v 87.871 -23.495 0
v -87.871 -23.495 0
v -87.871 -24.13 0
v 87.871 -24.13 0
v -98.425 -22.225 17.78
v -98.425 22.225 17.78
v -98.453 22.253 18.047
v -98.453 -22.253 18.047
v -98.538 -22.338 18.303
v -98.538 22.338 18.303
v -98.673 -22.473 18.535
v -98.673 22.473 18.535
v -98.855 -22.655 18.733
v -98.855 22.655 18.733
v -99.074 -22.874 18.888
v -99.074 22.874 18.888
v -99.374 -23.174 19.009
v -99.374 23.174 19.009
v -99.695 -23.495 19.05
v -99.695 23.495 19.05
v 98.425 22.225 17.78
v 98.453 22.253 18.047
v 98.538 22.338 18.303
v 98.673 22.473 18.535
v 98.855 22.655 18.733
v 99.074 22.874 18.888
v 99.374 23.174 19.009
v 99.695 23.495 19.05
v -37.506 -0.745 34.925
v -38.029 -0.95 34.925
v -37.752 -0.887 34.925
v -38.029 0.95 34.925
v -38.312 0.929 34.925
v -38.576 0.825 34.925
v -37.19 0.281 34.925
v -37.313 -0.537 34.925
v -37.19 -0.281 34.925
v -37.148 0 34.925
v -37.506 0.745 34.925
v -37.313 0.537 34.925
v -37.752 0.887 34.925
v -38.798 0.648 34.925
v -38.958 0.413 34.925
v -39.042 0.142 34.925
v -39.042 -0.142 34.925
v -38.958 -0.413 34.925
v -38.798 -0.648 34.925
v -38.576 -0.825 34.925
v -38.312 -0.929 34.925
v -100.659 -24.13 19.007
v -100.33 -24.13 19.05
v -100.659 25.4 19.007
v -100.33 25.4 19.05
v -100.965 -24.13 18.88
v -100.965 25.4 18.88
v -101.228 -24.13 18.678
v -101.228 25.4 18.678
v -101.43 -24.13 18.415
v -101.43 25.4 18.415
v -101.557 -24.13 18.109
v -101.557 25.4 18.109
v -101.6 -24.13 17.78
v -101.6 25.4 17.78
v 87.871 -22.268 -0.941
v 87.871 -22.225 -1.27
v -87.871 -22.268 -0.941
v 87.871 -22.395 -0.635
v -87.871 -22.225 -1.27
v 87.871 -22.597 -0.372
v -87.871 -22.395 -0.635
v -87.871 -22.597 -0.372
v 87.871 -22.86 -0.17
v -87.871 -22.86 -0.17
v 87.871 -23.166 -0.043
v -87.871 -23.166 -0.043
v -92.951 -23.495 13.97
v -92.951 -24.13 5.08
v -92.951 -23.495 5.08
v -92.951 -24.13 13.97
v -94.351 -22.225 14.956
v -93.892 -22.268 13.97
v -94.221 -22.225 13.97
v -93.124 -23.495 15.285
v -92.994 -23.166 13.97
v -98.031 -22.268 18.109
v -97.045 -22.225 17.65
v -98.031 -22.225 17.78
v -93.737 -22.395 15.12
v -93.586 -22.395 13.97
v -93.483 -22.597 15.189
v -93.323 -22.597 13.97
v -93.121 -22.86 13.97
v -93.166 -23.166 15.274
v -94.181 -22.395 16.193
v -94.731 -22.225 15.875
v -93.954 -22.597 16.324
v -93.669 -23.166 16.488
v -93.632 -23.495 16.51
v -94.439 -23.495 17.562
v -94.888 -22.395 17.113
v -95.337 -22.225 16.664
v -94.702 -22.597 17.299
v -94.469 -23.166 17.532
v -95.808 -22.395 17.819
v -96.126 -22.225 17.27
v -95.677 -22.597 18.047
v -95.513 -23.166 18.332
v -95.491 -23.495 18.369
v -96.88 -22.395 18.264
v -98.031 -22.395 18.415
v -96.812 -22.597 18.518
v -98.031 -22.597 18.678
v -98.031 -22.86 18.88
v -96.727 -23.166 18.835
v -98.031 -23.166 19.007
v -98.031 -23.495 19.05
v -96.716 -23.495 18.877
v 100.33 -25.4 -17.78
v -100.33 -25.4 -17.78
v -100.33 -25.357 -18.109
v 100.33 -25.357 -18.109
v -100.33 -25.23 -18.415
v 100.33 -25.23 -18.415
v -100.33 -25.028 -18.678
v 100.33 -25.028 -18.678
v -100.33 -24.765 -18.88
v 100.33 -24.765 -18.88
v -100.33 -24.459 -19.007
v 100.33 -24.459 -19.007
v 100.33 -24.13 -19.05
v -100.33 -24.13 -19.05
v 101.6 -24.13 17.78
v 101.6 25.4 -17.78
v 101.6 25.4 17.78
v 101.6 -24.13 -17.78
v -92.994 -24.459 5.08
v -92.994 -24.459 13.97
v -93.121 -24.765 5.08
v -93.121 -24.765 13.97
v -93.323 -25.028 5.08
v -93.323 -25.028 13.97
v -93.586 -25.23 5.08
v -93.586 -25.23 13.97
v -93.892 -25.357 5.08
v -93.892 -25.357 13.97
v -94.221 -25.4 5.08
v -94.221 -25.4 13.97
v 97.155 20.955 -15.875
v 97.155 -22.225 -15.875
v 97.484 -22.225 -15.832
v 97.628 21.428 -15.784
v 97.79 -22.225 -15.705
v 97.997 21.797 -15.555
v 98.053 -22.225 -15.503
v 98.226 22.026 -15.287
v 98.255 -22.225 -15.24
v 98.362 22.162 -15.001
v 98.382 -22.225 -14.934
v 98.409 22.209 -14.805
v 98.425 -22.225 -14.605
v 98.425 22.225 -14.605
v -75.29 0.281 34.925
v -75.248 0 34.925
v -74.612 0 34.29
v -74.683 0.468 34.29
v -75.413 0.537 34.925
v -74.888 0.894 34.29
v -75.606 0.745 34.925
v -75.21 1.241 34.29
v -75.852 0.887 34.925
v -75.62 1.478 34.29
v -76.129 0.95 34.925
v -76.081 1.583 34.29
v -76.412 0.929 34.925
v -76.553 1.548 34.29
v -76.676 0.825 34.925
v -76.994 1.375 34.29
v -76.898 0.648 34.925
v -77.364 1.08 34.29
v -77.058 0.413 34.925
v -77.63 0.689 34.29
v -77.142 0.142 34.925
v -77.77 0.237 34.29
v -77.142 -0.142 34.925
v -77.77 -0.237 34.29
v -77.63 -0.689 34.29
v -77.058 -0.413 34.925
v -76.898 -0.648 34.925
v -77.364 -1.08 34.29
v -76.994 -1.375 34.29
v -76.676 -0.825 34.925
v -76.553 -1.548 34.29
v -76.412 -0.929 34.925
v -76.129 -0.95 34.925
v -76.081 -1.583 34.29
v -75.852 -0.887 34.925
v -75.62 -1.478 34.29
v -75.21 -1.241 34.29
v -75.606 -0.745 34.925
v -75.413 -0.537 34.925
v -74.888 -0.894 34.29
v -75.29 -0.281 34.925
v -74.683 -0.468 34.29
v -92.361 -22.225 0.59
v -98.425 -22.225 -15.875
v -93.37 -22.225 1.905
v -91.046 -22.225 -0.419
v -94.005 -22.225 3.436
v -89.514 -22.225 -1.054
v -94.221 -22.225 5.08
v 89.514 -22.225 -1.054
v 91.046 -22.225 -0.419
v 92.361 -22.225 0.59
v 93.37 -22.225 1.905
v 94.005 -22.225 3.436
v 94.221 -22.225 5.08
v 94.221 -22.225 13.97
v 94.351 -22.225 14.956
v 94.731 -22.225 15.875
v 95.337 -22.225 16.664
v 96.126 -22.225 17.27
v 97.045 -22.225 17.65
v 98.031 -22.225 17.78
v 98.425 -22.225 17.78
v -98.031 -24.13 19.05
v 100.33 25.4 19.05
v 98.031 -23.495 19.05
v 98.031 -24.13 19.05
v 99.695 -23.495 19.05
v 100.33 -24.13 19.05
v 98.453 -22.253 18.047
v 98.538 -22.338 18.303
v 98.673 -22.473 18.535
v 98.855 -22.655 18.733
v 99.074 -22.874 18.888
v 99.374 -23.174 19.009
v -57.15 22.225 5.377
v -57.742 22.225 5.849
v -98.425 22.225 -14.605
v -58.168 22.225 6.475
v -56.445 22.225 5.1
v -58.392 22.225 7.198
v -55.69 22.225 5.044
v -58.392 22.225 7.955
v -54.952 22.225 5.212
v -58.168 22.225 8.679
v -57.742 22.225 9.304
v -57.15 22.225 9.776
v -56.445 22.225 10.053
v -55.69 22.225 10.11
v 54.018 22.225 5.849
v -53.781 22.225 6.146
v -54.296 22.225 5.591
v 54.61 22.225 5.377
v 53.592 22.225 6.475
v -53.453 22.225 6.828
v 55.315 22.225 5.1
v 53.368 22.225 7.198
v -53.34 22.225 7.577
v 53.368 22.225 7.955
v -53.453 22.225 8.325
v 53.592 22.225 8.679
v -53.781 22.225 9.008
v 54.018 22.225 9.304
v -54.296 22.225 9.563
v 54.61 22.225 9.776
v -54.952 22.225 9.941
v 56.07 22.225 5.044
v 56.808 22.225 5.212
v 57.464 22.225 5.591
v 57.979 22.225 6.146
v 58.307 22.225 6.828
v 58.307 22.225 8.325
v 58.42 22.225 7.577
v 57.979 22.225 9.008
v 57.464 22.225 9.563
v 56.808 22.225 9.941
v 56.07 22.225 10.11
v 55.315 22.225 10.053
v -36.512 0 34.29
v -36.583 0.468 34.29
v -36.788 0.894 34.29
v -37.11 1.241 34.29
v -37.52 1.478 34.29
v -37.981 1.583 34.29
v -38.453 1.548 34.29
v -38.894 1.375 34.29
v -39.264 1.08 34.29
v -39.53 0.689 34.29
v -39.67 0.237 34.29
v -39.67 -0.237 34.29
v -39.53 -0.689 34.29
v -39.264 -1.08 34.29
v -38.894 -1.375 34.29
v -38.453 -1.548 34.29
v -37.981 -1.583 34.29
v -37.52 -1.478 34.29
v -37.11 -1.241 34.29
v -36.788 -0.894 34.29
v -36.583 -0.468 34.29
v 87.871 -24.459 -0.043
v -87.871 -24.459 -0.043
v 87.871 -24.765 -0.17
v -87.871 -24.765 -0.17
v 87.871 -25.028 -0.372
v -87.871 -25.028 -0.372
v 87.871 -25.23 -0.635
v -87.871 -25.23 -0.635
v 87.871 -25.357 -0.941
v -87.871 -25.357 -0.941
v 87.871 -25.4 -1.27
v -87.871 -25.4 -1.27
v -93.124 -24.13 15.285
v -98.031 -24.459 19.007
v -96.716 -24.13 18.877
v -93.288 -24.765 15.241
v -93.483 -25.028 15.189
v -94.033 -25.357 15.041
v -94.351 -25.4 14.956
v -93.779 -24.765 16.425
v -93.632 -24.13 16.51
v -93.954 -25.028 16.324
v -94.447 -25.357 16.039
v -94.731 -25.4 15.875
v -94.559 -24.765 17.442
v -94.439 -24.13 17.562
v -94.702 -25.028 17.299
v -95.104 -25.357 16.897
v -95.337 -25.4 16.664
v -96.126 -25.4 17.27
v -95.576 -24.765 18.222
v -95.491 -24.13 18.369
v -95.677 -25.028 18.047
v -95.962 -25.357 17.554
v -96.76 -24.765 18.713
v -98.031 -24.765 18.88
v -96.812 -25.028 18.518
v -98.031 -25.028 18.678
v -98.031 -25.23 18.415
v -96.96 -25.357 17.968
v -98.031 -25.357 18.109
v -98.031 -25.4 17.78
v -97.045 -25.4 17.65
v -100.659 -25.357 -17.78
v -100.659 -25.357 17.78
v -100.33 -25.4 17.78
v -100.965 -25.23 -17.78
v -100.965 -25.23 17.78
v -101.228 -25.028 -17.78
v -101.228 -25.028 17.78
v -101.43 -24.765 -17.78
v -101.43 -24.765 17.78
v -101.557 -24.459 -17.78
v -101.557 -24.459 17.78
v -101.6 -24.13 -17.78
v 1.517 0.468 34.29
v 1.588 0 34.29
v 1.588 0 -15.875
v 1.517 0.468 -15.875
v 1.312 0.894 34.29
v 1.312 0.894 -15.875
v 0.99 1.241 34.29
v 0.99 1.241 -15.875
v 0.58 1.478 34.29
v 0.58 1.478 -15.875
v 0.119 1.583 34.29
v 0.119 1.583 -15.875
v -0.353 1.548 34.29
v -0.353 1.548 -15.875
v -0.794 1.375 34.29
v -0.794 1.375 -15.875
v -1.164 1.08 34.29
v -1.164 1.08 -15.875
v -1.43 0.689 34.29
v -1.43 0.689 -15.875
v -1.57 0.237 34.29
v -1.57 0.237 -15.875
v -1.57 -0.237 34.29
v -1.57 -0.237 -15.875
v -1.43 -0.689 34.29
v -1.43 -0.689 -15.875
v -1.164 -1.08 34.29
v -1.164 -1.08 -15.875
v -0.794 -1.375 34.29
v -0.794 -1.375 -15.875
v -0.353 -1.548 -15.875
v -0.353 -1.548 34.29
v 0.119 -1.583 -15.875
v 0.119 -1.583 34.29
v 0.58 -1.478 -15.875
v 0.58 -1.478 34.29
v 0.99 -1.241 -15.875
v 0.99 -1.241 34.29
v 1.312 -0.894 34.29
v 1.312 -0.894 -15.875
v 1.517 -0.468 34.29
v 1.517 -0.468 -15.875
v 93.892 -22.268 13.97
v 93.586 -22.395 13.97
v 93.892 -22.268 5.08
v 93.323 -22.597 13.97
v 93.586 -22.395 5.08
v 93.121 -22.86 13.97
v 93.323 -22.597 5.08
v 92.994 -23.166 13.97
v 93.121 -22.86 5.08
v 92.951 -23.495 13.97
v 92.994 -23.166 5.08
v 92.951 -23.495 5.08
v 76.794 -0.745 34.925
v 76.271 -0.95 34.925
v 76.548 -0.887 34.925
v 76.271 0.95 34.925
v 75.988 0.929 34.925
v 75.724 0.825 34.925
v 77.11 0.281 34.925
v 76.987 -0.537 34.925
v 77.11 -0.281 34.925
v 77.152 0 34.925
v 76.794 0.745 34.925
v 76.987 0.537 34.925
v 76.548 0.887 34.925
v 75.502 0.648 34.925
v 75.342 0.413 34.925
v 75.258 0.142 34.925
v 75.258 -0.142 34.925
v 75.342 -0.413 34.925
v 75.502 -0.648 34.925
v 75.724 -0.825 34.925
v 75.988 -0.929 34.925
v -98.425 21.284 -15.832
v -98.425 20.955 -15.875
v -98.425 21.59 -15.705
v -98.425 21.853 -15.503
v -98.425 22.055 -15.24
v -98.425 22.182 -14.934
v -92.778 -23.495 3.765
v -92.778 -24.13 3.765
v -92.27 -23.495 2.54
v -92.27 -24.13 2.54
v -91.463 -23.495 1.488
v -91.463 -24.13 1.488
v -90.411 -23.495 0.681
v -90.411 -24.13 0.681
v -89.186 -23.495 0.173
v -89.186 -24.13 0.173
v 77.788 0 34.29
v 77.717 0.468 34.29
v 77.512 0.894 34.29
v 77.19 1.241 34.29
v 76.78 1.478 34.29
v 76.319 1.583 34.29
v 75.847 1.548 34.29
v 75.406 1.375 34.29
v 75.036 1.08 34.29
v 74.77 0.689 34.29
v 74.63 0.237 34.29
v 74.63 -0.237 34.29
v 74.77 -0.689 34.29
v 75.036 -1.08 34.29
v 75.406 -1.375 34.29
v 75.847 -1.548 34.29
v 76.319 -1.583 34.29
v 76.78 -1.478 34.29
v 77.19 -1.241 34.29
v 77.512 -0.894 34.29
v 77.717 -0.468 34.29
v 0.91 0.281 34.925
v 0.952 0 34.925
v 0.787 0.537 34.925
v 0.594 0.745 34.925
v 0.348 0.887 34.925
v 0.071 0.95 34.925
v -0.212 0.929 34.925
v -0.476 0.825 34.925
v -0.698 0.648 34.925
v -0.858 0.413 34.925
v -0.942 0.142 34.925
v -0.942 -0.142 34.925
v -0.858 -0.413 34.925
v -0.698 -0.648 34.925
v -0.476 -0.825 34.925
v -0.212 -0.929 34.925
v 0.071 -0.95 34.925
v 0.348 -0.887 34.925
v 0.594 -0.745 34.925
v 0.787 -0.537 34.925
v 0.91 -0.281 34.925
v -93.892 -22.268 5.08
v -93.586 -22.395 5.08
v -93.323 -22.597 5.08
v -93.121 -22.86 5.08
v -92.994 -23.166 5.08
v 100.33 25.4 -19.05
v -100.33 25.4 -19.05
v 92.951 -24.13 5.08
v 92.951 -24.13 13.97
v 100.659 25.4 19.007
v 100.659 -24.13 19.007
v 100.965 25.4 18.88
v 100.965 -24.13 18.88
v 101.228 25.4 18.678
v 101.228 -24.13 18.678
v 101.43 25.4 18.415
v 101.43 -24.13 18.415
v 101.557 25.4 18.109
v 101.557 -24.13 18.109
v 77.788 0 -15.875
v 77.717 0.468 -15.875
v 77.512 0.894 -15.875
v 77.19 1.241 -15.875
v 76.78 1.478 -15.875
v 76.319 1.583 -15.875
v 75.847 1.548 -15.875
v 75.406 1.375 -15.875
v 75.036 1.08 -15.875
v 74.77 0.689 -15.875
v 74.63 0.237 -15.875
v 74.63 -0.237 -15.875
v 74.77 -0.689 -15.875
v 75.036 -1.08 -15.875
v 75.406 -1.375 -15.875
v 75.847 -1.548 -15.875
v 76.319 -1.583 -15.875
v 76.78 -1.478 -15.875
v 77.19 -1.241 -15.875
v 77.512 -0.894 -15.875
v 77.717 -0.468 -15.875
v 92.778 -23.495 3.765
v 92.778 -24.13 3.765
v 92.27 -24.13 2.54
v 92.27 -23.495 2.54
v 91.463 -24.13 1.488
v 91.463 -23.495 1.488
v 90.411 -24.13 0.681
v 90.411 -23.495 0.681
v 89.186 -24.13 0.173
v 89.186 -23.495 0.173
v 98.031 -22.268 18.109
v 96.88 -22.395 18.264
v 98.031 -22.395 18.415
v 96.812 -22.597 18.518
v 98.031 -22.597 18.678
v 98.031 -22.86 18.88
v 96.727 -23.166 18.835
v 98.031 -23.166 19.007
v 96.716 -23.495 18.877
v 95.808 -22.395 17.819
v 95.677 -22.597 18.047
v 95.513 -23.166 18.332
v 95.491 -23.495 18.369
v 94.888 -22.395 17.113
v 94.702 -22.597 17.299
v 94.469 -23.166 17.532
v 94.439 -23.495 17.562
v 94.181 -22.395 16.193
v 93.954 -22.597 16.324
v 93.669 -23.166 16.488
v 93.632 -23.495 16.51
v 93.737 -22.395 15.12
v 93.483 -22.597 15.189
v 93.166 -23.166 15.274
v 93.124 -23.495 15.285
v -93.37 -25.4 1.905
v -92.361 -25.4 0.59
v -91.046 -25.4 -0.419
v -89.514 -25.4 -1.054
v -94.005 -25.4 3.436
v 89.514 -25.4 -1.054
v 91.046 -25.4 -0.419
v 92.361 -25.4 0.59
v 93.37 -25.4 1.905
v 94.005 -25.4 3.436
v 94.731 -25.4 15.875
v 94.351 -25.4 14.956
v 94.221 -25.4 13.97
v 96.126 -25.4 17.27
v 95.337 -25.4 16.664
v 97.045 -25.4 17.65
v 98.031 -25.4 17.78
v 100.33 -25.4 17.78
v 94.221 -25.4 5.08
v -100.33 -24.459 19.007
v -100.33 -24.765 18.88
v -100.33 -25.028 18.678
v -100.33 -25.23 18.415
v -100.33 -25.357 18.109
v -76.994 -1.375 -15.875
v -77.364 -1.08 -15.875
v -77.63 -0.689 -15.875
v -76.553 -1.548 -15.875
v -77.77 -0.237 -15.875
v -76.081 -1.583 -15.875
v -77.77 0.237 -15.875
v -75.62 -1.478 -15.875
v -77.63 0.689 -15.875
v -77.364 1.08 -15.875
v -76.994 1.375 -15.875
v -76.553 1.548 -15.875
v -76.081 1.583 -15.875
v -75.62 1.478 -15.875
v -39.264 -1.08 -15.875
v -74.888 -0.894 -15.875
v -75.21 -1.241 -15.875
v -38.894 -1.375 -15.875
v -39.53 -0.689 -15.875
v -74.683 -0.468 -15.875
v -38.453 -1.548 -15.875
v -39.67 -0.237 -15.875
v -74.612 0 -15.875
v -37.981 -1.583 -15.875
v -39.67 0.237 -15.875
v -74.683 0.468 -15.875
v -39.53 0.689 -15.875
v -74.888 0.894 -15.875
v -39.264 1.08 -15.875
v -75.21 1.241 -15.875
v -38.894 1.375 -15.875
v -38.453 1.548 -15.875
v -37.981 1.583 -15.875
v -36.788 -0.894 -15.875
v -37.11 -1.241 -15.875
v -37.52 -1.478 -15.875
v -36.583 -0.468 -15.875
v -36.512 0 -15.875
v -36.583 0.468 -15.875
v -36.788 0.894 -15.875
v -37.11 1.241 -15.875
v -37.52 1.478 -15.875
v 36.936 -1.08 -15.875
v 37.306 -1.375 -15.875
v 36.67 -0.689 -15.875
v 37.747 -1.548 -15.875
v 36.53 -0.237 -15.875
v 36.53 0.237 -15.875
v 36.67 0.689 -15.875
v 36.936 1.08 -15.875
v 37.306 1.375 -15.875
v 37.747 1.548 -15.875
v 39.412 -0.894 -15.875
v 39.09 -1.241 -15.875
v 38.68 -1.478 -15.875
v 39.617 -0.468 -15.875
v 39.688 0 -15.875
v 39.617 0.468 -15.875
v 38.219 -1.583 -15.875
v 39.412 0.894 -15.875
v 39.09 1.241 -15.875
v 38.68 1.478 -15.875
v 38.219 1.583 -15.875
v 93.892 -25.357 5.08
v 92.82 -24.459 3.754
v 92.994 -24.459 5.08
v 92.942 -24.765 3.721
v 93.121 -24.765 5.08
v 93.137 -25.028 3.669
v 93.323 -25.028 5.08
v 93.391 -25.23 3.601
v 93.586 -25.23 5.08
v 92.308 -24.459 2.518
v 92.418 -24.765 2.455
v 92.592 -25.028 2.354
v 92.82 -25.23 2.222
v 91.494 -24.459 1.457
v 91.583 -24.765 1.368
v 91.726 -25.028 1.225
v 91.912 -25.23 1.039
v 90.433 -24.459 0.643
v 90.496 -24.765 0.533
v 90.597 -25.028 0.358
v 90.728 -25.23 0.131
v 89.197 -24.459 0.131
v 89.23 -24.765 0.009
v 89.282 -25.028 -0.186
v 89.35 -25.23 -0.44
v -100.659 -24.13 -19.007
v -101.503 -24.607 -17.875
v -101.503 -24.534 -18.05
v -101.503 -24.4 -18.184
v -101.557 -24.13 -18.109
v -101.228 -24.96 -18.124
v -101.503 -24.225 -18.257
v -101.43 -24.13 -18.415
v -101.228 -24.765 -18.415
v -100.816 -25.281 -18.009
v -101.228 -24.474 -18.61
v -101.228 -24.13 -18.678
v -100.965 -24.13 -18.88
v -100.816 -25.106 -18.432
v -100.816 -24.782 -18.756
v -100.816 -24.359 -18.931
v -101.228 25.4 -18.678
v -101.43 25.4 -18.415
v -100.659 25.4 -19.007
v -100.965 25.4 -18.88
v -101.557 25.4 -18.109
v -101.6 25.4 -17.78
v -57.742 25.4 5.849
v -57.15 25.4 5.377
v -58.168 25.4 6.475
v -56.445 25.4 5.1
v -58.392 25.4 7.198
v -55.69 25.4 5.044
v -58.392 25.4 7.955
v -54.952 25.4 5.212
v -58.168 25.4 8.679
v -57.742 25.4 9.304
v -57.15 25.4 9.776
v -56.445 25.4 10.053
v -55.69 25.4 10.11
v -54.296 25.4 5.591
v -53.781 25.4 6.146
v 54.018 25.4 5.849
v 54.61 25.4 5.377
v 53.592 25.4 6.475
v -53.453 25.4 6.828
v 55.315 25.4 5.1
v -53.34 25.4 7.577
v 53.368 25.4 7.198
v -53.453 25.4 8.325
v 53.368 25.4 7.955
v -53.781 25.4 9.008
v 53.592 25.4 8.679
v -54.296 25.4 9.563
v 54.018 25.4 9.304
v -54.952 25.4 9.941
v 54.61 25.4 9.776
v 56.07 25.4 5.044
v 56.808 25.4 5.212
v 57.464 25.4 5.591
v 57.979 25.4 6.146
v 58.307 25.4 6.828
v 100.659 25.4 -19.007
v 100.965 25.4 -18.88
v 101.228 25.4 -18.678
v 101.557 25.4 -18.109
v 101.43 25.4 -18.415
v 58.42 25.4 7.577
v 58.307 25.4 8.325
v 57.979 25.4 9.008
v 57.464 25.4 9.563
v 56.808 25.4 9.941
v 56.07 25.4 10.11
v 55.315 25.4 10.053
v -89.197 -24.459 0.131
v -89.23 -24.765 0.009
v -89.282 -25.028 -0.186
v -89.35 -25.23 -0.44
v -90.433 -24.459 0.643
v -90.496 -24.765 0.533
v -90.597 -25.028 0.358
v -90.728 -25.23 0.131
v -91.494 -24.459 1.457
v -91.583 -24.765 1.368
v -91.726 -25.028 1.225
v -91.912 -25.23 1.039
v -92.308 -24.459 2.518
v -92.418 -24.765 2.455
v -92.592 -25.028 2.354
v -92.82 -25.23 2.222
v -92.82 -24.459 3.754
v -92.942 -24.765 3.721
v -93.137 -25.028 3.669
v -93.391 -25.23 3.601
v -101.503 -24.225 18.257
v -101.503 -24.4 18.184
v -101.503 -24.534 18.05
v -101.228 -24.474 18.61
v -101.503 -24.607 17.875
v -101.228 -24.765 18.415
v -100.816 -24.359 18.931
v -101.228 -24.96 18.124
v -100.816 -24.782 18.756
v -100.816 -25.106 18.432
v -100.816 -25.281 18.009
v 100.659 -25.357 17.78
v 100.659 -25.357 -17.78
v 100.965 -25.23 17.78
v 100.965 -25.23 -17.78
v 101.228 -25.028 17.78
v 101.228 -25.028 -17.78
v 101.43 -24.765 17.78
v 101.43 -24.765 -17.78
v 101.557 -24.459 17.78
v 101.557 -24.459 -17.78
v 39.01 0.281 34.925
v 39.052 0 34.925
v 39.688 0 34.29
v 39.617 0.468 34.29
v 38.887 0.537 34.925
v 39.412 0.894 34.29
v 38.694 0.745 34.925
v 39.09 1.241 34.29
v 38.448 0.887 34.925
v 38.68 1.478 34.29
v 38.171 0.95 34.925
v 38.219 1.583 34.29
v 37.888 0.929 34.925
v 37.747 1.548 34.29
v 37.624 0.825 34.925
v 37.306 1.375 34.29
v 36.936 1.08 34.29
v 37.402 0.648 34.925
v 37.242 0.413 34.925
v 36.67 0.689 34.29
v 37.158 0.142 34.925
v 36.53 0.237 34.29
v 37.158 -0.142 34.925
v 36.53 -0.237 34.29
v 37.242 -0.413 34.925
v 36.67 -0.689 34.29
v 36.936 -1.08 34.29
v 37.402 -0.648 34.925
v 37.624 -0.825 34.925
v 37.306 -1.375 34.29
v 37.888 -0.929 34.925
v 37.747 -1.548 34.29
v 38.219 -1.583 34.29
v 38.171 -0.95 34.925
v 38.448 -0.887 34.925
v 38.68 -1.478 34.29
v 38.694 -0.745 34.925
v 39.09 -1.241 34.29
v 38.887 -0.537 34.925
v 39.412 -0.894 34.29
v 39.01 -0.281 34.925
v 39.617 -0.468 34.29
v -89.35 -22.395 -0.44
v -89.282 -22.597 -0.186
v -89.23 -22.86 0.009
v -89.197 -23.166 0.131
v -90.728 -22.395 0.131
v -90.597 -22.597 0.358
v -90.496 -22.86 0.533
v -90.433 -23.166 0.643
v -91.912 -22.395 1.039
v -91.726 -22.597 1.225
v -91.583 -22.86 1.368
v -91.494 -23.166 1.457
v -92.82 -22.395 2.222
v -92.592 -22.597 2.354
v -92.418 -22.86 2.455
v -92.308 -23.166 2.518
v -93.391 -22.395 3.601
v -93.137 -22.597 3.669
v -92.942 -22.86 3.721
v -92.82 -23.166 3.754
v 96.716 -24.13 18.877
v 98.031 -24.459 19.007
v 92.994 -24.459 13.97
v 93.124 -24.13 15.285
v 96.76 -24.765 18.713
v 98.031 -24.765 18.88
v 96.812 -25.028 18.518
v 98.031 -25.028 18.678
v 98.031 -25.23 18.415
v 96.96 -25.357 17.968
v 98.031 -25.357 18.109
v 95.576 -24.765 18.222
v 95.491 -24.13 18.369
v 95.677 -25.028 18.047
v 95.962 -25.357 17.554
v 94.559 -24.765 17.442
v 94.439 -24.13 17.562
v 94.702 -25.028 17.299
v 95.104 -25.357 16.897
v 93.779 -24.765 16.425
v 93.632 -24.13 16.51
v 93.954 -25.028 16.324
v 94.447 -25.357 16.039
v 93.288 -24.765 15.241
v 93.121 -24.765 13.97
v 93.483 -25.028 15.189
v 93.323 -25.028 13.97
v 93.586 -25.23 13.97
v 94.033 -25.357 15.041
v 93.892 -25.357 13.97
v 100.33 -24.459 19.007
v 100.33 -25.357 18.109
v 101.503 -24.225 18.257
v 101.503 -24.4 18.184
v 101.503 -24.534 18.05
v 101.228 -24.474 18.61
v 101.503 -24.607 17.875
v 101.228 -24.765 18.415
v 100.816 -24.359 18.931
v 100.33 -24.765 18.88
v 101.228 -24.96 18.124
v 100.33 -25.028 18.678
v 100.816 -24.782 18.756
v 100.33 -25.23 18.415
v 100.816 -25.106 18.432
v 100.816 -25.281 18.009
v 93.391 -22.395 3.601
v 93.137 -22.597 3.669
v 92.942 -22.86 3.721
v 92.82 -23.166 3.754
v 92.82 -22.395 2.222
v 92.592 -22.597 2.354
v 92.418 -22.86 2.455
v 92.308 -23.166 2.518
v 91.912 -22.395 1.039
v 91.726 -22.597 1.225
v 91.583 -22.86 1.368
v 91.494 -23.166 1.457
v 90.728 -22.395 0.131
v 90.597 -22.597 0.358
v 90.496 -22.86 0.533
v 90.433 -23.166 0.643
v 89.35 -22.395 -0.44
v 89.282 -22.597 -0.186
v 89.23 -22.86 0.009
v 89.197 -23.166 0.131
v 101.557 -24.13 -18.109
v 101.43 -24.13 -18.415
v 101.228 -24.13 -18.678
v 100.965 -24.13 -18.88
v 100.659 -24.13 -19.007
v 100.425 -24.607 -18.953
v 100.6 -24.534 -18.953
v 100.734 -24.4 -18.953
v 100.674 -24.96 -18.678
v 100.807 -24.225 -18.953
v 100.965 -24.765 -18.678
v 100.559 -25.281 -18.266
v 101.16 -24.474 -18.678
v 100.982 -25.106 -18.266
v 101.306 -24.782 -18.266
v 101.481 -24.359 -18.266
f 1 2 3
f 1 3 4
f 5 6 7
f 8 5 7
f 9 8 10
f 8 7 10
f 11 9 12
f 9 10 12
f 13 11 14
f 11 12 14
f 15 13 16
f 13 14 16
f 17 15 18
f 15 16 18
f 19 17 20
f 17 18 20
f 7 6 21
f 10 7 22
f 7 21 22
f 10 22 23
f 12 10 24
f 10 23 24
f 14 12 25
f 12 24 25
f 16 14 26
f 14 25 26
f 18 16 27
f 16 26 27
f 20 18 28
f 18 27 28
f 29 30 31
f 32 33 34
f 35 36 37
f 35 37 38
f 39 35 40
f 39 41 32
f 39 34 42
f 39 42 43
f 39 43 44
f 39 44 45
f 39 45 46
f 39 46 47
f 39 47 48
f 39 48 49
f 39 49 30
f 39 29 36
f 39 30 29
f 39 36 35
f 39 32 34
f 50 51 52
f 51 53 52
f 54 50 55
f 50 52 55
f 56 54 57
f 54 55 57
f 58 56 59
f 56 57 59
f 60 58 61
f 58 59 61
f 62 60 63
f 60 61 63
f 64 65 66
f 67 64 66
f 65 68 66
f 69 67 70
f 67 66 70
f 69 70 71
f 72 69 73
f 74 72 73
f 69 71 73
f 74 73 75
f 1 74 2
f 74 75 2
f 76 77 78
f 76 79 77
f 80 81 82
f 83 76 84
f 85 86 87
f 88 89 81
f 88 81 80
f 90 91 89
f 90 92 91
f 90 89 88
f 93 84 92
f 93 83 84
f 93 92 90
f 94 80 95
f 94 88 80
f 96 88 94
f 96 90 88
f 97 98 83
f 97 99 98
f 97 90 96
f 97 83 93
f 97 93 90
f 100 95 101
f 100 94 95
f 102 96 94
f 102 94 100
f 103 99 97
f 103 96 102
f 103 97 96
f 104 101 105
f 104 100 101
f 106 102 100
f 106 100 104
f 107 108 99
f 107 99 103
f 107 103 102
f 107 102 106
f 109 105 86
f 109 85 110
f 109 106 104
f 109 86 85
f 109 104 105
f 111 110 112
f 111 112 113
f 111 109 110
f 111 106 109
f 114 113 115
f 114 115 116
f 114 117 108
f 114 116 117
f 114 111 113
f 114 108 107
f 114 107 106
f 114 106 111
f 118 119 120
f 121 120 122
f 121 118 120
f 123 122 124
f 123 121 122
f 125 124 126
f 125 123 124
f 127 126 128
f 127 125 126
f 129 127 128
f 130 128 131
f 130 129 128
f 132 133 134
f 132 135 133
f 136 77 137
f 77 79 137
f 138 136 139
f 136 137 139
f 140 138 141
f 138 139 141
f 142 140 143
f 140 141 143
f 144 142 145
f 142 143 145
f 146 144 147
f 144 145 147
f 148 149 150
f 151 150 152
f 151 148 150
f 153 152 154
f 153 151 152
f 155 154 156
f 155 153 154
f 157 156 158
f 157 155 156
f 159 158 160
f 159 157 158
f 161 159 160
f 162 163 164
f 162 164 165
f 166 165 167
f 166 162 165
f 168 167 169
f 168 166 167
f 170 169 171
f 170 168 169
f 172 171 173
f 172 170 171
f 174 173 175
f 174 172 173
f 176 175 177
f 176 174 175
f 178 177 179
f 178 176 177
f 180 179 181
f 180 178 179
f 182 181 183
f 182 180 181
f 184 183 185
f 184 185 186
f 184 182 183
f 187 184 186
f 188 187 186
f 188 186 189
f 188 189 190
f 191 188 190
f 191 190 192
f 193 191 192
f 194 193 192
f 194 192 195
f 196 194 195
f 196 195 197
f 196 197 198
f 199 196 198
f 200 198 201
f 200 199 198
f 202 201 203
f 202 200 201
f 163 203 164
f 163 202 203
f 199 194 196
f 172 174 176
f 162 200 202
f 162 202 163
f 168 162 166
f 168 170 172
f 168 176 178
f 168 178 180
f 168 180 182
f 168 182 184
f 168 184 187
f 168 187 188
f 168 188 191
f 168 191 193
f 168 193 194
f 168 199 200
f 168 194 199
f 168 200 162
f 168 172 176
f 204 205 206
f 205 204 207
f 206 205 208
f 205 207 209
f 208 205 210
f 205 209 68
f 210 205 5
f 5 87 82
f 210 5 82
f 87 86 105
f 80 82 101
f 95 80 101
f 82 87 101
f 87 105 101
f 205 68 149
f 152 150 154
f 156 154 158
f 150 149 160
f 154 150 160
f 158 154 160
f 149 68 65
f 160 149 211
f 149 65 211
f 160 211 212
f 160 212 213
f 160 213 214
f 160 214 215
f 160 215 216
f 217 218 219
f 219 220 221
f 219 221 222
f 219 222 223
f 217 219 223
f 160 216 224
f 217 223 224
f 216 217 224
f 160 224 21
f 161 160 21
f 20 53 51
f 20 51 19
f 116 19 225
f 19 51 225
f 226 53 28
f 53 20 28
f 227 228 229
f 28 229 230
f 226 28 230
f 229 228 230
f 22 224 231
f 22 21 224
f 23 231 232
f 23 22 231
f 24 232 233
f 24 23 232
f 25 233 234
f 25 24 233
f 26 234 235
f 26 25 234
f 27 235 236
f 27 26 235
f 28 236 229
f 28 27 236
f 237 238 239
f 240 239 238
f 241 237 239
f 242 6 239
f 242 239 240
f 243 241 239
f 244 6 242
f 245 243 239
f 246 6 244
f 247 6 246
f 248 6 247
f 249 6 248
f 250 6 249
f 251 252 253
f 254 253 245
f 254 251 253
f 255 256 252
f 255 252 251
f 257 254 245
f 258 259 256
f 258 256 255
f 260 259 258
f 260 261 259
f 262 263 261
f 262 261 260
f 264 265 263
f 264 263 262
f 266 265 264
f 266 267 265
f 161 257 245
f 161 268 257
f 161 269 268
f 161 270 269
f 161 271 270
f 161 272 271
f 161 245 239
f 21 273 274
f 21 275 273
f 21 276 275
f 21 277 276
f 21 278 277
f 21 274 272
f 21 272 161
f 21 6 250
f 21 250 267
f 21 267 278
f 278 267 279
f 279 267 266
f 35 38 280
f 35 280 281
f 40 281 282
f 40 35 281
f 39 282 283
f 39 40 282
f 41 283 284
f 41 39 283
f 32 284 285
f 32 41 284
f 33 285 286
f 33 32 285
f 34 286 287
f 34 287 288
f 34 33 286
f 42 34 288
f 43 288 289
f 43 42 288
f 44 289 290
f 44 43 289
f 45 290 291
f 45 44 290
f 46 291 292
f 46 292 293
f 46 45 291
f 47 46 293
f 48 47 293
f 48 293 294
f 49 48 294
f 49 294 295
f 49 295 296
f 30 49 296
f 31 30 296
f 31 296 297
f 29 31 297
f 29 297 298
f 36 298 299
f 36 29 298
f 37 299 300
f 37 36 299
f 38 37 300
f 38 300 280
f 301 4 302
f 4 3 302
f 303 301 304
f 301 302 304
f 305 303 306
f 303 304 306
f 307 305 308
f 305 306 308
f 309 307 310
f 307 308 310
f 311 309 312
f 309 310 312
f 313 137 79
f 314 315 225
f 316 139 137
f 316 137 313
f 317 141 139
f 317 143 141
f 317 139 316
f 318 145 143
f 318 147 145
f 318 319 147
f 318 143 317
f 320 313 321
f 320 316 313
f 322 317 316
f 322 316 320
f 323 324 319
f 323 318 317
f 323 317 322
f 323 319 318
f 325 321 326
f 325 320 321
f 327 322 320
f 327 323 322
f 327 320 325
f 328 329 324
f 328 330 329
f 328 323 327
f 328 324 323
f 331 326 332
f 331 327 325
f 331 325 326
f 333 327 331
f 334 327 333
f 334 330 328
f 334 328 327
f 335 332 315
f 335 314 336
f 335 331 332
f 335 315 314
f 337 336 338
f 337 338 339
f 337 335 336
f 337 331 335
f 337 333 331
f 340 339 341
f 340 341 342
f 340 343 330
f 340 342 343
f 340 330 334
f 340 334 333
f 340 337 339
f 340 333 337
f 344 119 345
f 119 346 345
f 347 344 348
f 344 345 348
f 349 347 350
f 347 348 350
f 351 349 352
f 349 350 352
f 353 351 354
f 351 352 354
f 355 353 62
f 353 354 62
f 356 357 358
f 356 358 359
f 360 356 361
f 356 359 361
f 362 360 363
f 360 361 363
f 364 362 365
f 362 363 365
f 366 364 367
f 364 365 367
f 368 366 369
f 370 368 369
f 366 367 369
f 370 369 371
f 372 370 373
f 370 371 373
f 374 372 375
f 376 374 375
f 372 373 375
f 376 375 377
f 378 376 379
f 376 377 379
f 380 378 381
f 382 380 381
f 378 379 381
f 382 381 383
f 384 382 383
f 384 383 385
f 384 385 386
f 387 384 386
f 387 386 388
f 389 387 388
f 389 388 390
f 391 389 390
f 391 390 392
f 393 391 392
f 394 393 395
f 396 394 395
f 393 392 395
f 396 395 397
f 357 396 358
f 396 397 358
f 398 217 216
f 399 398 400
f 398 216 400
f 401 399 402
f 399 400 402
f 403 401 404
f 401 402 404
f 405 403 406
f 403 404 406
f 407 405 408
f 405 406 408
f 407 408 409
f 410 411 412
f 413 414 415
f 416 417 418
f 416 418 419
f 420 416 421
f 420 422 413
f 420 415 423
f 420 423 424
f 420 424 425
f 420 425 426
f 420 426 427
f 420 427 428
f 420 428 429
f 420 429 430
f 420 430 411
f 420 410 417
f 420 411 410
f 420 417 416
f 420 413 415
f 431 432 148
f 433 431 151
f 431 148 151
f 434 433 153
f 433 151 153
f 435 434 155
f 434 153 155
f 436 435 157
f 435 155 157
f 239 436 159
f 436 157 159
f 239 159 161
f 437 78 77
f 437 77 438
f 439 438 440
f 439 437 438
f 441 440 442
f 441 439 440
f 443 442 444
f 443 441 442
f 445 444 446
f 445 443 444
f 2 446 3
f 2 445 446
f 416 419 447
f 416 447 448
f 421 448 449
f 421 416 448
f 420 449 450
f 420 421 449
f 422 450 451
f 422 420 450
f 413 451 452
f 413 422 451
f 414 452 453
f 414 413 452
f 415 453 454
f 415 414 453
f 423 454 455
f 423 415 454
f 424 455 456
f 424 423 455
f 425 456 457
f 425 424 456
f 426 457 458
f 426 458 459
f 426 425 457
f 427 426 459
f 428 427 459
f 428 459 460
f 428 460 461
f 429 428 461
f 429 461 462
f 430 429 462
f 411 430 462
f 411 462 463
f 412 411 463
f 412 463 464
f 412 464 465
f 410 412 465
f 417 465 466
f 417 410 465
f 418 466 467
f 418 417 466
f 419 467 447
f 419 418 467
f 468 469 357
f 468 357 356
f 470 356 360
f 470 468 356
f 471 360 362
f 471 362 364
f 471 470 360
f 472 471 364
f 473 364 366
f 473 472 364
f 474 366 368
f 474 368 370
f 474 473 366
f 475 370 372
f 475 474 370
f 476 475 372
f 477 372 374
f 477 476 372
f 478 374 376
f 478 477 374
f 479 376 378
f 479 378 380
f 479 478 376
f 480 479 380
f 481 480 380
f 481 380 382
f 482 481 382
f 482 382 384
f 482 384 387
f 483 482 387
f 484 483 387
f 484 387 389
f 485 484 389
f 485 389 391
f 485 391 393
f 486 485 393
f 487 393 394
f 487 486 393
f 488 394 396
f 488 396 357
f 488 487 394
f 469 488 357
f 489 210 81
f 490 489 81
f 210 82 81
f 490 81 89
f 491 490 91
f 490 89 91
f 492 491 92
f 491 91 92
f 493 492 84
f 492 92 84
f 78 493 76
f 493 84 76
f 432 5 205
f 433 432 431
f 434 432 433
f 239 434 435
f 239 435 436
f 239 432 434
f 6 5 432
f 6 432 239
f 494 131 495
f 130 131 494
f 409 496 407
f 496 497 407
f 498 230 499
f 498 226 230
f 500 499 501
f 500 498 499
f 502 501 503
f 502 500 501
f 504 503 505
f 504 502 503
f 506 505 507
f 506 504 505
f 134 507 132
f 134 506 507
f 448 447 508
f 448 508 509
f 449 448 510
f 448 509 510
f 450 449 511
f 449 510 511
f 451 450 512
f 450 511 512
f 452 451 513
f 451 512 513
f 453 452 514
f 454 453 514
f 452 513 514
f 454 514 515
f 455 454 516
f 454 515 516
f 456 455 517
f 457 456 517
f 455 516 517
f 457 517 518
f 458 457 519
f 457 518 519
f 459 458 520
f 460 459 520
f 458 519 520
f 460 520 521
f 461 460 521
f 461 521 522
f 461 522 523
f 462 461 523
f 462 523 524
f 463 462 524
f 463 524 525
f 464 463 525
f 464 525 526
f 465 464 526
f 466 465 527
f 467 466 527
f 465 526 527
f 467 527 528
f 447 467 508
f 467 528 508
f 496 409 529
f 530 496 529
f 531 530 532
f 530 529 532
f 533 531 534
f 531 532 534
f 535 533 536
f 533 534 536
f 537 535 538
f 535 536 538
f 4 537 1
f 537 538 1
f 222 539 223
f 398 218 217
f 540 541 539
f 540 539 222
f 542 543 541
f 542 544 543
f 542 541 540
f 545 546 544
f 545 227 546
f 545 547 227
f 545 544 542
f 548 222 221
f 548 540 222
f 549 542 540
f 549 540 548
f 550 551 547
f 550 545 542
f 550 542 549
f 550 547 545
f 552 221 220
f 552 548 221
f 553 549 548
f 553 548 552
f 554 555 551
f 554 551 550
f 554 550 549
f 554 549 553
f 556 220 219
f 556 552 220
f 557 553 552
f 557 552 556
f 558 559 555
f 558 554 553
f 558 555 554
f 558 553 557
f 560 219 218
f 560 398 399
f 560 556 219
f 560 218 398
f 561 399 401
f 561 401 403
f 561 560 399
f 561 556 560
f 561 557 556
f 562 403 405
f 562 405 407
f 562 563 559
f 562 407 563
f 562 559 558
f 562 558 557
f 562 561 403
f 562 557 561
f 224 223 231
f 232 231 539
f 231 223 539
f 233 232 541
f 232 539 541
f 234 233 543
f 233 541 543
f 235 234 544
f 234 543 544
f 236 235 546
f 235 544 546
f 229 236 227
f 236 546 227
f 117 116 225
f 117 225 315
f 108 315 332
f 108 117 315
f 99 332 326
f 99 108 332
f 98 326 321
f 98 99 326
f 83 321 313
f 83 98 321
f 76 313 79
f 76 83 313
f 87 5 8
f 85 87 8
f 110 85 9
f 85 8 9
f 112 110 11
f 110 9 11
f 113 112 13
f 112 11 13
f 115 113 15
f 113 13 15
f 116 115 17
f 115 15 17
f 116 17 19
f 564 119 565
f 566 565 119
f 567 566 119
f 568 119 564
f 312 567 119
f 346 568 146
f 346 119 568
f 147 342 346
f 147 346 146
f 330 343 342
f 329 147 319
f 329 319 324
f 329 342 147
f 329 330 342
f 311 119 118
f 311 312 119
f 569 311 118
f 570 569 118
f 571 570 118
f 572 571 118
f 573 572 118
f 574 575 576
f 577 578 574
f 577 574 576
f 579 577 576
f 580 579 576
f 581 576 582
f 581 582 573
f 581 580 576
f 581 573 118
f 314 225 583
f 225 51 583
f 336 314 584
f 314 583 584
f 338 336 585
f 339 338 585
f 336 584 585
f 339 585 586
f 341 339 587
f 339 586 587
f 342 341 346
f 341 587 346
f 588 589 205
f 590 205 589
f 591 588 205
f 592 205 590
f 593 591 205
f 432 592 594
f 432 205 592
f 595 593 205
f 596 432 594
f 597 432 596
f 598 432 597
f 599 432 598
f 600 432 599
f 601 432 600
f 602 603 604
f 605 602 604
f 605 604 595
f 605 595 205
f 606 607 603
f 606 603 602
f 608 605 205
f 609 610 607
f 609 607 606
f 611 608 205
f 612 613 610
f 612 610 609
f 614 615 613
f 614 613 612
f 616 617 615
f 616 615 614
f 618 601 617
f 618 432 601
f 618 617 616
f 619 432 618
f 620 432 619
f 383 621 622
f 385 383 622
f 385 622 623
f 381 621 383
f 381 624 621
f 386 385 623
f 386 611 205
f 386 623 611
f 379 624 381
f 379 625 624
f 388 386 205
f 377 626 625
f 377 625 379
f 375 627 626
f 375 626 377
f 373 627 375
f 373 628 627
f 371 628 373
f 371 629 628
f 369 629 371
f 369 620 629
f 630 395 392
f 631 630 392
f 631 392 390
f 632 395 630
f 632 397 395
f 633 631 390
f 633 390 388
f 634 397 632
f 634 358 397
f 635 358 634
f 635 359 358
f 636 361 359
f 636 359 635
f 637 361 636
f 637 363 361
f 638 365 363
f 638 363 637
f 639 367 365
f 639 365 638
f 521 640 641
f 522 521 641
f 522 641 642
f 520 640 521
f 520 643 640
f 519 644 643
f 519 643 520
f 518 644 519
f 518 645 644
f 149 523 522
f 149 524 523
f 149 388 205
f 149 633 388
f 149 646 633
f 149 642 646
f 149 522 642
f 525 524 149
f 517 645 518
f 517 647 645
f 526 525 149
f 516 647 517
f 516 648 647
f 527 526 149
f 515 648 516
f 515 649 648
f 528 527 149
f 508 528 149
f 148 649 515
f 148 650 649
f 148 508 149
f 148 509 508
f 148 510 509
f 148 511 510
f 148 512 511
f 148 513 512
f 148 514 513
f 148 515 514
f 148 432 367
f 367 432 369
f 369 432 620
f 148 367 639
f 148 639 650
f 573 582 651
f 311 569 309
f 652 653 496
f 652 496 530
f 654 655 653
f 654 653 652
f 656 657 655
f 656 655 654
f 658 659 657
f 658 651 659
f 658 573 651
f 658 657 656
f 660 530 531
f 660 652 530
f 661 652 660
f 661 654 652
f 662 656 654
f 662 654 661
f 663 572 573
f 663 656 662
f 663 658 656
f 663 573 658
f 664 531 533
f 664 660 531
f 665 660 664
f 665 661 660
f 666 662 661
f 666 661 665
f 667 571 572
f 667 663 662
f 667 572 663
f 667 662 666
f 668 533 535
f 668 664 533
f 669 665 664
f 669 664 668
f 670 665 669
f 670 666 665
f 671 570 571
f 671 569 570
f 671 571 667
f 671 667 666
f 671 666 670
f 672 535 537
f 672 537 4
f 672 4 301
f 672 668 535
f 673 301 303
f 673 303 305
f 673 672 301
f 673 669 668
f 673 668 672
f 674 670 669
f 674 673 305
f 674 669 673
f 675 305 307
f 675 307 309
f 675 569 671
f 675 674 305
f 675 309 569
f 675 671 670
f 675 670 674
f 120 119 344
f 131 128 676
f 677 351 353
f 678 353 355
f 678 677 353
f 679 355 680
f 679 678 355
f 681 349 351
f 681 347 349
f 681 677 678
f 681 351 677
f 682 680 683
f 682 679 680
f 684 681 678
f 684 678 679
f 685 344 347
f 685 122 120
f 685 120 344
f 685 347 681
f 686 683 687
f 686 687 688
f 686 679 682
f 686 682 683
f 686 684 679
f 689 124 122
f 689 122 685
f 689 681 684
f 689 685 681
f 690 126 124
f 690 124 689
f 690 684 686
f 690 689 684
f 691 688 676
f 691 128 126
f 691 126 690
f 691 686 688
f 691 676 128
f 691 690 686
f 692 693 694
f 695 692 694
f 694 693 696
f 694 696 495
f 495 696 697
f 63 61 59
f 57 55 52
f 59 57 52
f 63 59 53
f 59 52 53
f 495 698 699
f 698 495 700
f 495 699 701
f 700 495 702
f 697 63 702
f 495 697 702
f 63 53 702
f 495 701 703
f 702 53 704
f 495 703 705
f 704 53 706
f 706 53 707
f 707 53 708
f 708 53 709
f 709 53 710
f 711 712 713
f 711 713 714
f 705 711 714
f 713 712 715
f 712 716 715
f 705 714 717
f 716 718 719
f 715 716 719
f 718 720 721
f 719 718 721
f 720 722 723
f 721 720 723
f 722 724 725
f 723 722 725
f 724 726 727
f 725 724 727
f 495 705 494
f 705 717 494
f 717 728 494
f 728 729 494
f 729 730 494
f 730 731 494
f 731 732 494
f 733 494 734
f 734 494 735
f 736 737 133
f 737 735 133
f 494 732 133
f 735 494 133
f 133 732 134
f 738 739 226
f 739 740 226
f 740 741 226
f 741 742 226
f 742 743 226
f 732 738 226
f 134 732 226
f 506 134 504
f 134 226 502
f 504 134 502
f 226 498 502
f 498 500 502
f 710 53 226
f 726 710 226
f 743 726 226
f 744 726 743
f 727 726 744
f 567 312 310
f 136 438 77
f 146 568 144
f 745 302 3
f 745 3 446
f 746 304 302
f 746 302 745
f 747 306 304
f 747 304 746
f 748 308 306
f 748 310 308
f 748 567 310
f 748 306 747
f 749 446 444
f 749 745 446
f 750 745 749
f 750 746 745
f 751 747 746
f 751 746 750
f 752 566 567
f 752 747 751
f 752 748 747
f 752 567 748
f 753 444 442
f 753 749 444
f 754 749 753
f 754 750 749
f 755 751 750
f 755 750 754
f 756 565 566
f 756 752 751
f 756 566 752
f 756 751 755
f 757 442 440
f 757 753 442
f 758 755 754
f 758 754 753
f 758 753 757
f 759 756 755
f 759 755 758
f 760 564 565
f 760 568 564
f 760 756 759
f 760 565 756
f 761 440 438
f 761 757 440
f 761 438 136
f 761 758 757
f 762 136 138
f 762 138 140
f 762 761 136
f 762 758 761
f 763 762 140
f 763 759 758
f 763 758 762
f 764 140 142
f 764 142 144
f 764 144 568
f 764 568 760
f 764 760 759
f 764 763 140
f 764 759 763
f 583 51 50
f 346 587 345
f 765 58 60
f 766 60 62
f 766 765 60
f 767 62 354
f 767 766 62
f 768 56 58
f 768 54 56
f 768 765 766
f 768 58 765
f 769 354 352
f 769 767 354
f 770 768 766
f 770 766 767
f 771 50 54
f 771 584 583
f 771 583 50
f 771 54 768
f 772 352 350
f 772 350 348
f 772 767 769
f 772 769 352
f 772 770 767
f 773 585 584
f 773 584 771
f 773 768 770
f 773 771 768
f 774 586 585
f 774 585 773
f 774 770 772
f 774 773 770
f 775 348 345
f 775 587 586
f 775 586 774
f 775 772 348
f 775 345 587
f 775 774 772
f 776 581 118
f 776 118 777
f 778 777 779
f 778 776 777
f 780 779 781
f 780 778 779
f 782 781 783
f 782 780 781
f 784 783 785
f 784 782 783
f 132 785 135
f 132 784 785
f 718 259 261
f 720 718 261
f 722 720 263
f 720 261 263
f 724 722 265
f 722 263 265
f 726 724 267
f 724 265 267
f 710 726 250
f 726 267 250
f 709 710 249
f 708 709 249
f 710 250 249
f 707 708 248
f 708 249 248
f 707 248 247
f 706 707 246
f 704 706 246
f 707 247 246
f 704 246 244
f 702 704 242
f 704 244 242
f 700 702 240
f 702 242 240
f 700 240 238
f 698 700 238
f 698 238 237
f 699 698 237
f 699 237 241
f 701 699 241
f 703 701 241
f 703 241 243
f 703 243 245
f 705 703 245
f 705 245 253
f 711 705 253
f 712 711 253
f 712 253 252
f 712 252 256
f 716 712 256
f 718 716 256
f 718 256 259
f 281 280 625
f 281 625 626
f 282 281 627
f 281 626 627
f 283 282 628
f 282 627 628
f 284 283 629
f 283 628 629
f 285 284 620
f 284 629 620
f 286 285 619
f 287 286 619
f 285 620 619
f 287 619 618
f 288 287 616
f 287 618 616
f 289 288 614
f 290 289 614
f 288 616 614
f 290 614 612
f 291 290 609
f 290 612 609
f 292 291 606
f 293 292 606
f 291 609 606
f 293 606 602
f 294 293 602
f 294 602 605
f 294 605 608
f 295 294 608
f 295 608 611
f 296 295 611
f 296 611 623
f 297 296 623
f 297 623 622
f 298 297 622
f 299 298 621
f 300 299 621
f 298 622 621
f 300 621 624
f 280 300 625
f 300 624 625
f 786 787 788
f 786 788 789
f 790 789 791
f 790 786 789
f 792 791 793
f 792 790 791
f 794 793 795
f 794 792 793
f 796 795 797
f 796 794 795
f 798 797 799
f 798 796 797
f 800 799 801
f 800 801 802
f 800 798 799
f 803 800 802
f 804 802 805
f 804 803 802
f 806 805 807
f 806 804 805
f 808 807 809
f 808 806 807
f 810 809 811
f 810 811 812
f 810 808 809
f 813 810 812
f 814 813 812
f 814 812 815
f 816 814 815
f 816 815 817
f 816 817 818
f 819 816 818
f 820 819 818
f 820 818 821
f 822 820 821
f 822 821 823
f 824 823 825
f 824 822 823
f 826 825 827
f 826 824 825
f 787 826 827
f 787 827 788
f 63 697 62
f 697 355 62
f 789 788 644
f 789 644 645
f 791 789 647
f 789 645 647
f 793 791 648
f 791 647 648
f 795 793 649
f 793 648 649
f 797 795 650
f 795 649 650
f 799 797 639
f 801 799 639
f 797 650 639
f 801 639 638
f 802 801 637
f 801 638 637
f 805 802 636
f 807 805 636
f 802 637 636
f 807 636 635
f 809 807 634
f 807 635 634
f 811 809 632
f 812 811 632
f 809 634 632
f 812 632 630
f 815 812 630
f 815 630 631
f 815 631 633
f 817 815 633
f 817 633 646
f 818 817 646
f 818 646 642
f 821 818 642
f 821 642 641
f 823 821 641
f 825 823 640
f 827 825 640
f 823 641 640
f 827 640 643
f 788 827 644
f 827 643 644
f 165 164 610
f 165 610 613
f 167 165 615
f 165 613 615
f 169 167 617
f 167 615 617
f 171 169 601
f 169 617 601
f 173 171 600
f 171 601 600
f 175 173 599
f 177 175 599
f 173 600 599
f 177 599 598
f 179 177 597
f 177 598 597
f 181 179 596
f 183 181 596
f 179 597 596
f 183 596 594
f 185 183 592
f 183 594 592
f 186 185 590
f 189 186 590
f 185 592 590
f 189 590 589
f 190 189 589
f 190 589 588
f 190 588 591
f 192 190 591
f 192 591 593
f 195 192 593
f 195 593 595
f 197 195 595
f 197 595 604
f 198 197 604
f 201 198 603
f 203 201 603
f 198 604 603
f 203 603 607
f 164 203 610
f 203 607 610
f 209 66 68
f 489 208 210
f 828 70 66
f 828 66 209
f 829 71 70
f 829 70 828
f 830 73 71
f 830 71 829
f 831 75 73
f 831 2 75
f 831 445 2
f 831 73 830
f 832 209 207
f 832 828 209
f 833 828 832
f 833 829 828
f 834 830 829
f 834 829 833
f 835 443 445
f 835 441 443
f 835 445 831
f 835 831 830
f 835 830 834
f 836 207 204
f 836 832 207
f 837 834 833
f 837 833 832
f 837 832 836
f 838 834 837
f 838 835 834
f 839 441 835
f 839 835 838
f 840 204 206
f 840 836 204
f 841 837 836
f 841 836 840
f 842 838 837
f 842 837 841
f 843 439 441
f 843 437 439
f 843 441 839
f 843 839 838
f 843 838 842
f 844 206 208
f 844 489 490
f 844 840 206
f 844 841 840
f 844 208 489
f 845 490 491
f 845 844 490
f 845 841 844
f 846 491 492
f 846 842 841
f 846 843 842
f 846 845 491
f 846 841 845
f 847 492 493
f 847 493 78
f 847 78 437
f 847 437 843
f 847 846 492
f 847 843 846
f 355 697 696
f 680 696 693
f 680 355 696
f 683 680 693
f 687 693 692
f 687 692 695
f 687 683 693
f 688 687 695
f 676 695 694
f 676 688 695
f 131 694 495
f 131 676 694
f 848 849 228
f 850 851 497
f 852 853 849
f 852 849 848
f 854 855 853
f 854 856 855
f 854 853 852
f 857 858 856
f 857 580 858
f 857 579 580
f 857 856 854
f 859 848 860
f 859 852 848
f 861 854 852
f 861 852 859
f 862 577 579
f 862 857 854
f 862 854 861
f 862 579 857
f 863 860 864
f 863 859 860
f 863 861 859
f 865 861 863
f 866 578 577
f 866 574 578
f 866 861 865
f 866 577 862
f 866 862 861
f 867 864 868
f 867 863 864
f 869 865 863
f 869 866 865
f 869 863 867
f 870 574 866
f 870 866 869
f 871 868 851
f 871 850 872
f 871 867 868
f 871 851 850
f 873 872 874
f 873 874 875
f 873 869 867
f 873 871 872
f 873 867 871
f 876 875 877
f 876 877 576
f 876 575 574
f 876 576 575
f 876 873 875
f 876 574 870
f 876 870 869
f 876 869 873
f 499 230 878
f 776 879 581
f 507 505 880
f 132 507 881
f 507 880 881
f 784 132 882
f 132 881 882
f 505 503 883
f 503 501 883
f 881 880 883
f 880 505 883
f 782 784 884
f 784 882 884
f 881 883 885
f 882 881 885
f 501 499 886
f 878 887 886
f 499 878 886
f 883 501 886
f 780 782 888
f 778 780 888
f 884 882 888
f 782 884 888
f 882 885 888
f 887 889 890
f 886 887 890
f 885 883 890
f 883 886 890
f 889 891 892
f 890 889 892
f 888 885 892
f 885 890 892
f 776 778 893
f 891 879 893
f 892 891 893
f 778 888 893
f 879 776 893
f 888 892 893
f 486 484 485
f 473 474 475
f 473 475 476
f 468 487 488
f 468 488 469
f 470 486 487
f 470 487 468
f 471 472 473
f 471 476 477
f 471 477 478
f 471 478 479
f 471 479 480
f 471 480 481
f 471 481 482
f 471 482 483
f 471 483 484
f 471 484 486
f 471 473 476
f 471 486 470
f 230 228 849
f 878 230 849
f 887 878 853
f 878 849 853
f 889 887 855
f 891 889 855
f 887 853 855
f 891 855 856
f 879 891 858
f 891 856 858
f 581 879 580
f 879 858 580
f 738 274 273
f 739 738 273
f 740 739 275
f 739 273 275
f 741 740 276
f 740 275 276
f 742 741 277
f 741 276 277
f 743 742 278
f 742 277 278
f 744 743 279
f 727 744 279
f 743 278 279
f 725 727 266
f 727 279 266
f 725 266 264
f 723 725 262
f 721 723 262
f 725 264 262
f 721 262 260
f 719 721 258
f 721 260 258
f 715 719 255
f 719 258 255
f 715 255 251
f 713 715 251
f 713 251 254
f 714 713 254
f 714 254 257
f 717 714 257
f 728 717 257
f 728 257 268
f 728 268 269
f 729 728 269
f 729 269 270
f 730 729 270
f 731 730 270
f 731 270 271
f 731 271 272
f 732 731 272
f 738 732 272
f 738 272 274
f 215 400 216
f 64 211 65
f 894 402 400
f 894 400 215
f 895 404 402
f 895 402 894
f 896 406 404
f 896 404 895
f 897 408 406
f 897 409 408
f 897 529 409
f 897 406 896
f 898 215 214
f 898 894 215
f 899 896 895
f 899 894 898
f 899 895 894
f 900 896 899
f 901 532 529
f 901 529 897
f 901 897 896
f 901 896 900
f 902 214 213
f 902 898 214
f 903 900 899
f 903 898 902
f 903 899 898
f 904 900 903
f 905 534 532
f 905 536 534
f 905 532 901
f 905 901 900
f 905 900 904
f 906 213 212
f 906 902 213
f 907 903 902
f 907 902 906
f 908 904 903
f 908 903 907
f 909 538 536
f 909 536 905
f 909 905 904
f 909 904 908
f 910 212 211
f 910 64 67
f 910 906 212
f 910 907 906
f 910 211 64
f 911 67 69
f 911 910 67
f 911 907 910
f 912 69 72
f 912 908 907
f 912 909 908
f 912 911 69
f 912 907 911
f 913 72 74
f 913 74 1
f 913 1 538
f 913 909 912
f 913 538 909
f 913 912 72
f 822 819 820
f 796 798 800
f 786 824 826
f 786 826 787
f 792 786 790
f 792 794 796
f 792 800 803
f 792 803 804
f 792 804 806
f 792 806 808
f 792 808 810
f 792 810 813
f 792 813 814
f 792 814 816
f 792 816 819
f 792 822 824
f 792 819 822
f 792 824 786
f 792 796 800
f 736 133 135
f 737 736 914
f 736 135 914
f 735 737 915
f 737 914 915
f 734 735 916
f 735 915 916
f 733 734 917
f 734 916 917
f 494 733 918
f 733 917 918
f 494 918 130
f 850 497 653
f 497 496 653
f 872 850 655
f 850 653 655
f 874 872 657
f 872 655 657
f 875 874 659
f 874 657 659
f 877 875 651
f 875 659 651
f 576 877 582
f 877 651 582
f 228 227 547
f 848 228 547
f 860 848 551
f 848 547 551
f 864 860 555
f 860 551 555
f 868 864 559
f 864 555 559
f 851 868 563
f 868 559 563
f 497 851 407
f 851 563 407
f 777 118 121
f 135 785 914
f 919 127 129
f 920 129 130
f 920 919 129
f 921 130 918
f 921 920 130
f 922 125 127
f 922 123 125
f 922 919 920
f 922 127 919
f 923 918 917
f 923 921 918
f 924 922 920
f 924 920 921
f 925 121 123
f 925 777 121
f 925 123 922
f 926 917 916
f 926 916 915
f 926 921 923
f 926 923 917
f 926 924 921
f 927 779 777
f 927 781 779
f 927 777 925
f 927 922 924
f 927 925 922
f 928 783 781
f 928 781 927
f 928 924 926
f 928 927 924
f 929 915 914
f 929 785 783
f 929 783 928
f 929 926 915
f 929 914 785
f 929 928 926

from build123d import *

# Parameters (mm, degrees)
F0_W      = 203.2
F0_H      = 38.1
F1_DEPTH  = 25.4
F2_W      = 196.85
F2_H      = 44.45
F3_DEPTH  = 34.925
F4_R      = 1.5875
F5_DEPTH  = 50.8
F6_W      = 185.9018951654
F6_H      = 9.962297976
F7_DEPTH  = 19.05
F8_R      = 5.08
F9_SIZE   = 0.635
F10_R     = 1.27
F11_R     = 2.54
F12_DEPTH = 5.08


with BuildPart() as f1:
    # F0 (on Front) → F1 (new body, symmetric)
    with BuildSketch(Plane.XZ):
        Rectangle(F0_W, F0_H)
    extrude(amount=F1_DEPTH, both=True)

    # F2 (on face) → F3 (cut)
    with BuildSketch(Plane.XY.offset(19.05)):
        Rectangle(F2_W, F2_H)
    extrude(amount=-F3_DEPTH, mode=Mode.SUBTRACT)

    # F4 (on face) → F5 (join)
    with BuildSketch(Plane.XY.offset(-15.875)):
        Circle(F4_R)
        with Locations((-38.1, 0)):
            Circle(F4_R)
        with Locations((-76.2, 0)):
            Circle(F4_R)
        with Locations((38.1, 0)):
            Circle(F4_R)
        with Locations((76.2, 0)):
            Circle(F4_R)
    extrude(amount=F5_DEPTH)

    # F6 (on face) → F7 (cut)
    with BuildSketch(Plane.XY.offset(19.05)):
        with Locations((0, -23.8689258695)):
            Rectangle(F6_W, F6_H)
    extrude(amount=-F7_DEPTH, mode=Mode.SUBTRACT)

    # F8
    f8_edges = [f1.edges().sort_by_distance(p)[0] for p in [
        (-92.950948, -23.8125, 19.05),
        (-92.950948, -23.8125, 0),
        (92.950948, -23.8125, 19.05),
        (92.950948, -23.8125, 0),
    ]]
    fillet(f8_edges, radius=F8_R)

    # F9
    f9_edges = [f1.edges().sort_by_distance(p)[0] for p in [
        (-1.5875, 0, 34.925),
        (-39.6875, 0, 34.925),
        (36.5125, 0, 34.925),
        (74.6125, 0, 34.925),
        (-77.7875, 0, 34.925),
    ]]
    chamfer(f9_edges, length=F9_SIZE)

    # F10
    f10_edges = [f1.edges().sort_by_distance(p)[0] for p in [
        (0, 22.225, 19.05),
        (-98.425, 0, 19.05),
        (0, -25.4, 0),
        (-91.46305, -25.4, 1.487898),
        (-92.950948, -25.4, 9.525),
        (-99.815474, -25.4, 19.05),
        (-101.6, 0, 19.05),
        (101.6, 0, 19.05),
        (101.6, -25.4, 0),
        (0, -25.4, -19.05),
        (101.6, 0, -19.05),
        (-101.6, -25.4, 0),
        (-101.6, 0, -19.05),
        (0, 22.225, -15.875),
        (0, -22.225, 0),
        (98.425, 0, 19.05),
        (98.425, 0, -15.875),
    ]]
    fillet(f10_edges, radius=F10_R)

    # F11 (on face) → F12 (cut)
    with BuildSketch(Plane.XZ.offset(-22.225)):
        with Locations((55.88, 7.5767044909)):
            Circle(F11_R)
        with Locations((-55.88, 7.5767044909)):
            Circle(F11_R)
    extrude(amount=-F12_DEPTH, mode=Mode.SUBTRACT)


solid = f1.part
